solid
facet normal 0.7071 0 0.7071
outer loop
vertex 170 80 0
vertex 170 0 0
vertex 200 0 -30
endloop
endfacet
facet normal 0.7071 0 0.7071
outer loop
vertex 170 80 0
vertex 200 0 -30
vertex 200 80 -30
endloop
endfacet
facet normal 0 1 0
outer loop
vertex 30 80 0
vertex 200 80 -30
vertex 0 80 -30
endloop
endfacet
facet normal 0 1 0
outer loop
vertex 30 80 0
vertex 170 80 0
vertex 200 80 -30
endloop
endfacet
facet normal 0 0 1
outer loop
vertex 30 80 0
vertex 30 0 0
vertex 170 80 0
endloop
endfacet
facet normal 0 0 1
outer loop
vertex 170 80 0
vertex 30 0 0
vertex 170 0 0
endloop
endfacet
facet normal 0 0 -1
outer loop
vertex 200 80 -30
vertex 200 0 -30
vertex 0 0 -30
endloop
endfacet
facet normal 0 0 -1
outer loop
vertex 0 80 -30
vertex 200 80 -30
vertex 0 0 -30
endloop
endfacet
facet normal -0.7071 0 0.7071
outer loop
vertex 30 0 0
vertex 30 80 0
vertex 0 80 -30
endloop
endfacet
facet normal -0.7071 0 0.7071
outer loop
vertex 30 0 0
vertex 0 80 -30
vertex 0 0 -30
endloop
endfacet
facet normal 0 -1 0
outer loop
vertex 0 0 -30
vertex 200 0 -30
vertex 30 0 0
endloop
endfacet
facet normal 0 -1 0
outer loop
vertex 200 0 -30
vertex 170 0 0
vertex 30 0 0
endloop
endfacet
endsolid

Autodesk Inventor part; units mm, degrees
ref_plane "YZ Plane" through (0, 0, 0) normal (1, 0, 0) x (0, 1, 0)
ref_plane "XZ Plane" through (0, 0, 0) normal (0, 1, 0) x (-1, 0, 0)
ref_plane "XY Plane" through (0, 0, 0) normal (0, 0, 1) x (1, 0, 0)
sketch "Эскиз1" plane through (0, 0, 0) normal (0, 1, 0) x (-1, 0, 0)
  line L0 (0, 0) -> (-200, 0)
  line L1 (-200, 0) -> (-200, -30)
  line L2 (-200, -30) -> (0, -30)
  line L3 (0, -30) -> (0, 0)
  dimension "d0" = 200
  dimension "d1" = 30
extrude "Выдавливание1" add sketch "Эскиз1" along normal blind 80
chamfer "Фаска1" distance 30 angle 45 2 edges at (0, 40, 0) (200, 40, 0)
properties part number "dou_short_round" material "Красное дерево"
